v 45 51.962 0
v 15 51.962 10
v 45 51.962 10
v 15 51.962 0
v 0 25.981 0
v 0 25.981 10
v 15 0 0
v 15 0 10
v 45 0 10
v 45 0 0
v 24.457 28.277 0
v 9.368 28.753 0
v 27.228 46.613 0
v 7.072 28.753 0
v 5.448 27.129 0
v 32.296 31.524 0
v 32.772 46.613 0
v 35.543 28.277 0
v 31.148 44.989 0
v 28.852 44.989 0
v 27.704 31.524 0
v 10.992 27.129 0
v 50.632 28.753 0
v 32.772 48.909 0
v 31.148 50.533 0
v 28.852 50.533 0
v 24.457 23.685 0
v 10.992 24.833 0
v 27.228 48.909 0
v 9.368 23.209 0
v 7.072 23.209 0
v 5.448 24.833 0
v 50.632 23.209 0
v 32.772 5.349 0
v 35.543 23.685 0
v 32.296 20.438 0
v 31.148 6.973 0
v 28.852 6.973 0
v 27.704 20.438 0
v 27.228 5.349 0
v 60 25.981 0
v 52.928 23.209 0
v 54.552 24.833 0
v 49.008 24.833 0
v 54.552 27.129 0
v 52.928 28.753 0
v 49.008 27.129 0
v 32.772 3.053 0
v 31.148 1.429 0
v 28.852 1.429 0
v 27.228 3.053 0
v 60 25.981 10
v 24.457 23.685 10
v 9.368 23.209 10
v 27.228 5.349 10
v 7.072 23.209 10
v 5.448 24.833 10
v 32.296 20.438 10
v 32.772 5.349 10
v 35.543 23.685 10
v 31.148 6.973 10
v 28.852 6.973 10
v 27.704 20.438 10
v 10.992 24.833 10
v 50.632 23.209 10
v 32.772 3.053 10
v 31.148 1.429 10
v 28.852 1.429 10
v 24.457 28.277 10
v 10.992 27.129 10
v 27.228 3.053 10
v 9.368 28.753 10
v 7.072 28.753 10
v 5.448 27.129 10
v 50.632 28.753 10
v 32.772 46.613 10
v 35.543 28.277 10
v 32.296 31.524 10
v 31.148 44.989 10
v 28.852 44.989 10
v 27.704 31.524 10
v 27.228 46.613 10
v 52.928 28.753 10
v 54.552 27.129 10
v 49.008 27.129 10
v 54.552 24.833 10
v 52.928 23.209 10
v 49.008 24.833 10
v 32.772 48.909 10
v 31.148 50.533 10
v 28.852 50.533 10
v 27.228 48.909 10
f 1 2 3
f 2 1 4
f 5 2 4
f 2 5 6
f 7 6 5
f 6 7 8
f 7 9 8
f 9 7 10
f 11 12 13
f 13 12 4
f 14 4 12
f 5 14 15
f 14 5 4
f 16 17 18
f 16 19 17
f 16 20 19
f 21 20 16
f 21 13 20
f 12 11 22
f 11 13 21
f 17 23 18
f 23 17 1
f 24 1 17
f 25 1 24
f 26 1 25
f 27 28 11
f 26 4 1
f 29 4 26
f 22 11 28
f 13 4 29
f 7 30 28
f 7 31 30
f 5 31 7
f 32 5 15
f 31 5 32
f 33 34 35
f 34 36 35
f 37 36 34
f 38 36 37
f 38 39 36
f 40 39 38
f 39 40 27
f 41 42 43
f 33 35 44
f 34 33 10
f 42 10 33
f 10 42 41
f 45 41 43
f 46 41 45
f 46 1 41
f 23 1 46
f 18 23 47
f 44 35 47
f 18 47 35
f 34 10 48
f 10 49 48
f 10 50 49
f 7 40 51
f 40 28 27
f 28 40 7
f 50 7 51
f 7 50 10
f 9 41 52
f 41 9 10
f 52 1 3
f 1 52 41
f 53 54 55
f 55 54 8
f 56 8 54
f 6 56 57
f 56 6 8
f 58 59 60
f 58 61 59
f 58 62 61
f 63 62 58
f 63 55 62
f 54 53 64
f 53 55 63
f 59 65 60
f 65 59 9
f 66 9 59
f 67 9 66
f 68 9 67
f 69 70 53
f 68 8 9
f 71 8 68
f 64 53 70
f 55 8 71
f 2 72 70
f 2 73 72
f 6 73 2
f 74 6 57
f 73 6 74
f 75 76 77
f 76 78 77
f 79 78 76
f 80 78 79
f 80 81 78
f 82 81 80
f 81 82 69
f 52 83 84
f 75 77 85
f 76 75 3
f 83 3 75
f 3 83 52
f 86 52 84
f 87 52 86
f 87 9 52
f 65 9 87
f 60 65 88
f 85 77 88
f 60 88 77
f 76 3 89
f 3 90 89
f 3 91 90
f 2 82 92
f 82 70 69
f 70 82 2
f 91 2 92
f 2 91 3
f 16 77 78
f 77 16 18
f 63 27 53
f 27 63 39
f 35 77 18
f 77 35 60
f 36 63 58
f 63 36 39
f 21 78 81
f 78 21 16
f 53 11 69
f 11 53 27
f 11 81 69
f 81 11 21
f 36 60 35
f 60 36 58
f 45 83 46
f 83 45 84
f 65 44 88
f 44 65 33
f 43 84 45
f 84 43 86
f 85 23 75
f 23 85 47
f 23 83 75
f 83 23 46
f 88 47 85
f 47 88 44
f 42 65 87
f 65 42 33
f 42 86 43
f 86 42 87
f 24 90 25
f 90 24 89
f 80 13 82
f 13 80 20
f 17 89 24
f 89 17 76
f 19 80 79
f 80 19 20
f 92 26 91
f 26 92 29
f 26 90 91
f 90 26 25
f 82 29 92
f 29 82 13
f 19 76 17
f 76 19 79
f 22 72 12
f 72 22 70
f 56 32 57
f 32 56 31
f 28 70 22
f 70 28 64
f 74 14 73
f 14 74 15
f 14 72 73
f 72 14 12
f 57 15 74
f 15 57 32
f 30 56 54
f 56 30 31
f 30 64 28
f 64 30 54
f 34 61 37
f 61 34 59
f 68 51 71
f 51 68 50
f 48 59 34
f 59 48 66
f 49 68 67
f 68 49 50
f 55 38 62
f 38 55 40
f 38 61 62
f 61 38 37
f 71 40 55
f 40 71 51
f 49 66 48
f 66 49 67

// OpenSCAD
$fn = 32;

// ----------------------------------------------------------------------
// Polygon plate: 6-gon R30, 4 bolt windows
// ----------------------------------------------------------------------

// --- parameters (mm) ---
sides = 6;                // number of polygon sides
plate_r = 30;             // circumscribed radius of the polygon
bore_r = 6;               // centre bore radius
bolts = 4;                // number of bolt windows
ring_r = 21.78;           // bolt-circle radius
bolt_r = 3;               // bolt window radius
plate_t = 10;             // plate thickness, Z (extrusion height)

plate_d = 2 * plate_r;  // circumscribed diameter
bore_d = 2 * bore_r;  // centre bore diameter
bolt_d = 2 * bolt_r;  // bolt window diameter
ring_d = 2 * ring_r;  // bolt-circle diameter

profile = [[60, 25.981], [45, 51.962], [15, 51.962], [0, 25.981], [15, 0], [45, 0]];  // primary outline, 6 points, counter clockwise
void_1 = [[35.543, 28.277], [32.296, 31.524], [27.704, 31.524], [24.457, 28.277], [24.457, 23.685], [27.704, 20.438], [32.296, 20.438], [35.543, 23.685]];  // centre bore, 8 points
void_2 = [[54.552, 27.129], [52.928, 28.753], [50.632, 28.753], [49.008, 27.129], [49.008, 24.833], [50.632, 23.209], [52.928, 23.209], [54.552, 24.833]];  // bolt window 1, 8 points
void_3 = [[32.772, 48.909], [31.148, 50.533], [28.852, 50.533], [27.228, 48.909], [27.228, 46.613], [28.852, 44.989], [31.148, 44.989], [32.772, 46.613]];  // bolt window 2, 8 points
void_4 = [[10.992, 27.129], [9.368, 28.753], [7.072, 28.753], [5.448, 27.129], [5.448, 24.833], [7.072, 23.209], [9.368, 23.209], [10.992, 24.833]];  // bolt window 3, 8 points
void_5 = [[32.772, 5.349], [31.148, 6.973], [28.852, 6.973], [27.228, 5.349], [27.228, 3.053], [28.852, 1.429], [31.148, 1.429], [32.772, 3.053]];  // bolt window 4, 8 points

// --- the one profile operation ---
difference() {
  linear_extrude(height = plate_t) polygon(points = profile);
  translate([0, 0, -1])
    linear_extrude(height = plate_t + 2) polygon(points = void_1);
  translate([0, 0, -1])
    linear_extrude(height = plate_t + 2) polygon(points = void_2);
  translate([0, 0, -1])
    linear_extrude(height = plate_t + 2) polygon(points = void_3);
  translate([0, 0, -1])
    linear_extrude(height = plate_t + 2) polygon(points = void_4);
  translate([0, 0, -1])
    linear_extrude(height = plate_t + 2) polygon(points = void_5);
}
